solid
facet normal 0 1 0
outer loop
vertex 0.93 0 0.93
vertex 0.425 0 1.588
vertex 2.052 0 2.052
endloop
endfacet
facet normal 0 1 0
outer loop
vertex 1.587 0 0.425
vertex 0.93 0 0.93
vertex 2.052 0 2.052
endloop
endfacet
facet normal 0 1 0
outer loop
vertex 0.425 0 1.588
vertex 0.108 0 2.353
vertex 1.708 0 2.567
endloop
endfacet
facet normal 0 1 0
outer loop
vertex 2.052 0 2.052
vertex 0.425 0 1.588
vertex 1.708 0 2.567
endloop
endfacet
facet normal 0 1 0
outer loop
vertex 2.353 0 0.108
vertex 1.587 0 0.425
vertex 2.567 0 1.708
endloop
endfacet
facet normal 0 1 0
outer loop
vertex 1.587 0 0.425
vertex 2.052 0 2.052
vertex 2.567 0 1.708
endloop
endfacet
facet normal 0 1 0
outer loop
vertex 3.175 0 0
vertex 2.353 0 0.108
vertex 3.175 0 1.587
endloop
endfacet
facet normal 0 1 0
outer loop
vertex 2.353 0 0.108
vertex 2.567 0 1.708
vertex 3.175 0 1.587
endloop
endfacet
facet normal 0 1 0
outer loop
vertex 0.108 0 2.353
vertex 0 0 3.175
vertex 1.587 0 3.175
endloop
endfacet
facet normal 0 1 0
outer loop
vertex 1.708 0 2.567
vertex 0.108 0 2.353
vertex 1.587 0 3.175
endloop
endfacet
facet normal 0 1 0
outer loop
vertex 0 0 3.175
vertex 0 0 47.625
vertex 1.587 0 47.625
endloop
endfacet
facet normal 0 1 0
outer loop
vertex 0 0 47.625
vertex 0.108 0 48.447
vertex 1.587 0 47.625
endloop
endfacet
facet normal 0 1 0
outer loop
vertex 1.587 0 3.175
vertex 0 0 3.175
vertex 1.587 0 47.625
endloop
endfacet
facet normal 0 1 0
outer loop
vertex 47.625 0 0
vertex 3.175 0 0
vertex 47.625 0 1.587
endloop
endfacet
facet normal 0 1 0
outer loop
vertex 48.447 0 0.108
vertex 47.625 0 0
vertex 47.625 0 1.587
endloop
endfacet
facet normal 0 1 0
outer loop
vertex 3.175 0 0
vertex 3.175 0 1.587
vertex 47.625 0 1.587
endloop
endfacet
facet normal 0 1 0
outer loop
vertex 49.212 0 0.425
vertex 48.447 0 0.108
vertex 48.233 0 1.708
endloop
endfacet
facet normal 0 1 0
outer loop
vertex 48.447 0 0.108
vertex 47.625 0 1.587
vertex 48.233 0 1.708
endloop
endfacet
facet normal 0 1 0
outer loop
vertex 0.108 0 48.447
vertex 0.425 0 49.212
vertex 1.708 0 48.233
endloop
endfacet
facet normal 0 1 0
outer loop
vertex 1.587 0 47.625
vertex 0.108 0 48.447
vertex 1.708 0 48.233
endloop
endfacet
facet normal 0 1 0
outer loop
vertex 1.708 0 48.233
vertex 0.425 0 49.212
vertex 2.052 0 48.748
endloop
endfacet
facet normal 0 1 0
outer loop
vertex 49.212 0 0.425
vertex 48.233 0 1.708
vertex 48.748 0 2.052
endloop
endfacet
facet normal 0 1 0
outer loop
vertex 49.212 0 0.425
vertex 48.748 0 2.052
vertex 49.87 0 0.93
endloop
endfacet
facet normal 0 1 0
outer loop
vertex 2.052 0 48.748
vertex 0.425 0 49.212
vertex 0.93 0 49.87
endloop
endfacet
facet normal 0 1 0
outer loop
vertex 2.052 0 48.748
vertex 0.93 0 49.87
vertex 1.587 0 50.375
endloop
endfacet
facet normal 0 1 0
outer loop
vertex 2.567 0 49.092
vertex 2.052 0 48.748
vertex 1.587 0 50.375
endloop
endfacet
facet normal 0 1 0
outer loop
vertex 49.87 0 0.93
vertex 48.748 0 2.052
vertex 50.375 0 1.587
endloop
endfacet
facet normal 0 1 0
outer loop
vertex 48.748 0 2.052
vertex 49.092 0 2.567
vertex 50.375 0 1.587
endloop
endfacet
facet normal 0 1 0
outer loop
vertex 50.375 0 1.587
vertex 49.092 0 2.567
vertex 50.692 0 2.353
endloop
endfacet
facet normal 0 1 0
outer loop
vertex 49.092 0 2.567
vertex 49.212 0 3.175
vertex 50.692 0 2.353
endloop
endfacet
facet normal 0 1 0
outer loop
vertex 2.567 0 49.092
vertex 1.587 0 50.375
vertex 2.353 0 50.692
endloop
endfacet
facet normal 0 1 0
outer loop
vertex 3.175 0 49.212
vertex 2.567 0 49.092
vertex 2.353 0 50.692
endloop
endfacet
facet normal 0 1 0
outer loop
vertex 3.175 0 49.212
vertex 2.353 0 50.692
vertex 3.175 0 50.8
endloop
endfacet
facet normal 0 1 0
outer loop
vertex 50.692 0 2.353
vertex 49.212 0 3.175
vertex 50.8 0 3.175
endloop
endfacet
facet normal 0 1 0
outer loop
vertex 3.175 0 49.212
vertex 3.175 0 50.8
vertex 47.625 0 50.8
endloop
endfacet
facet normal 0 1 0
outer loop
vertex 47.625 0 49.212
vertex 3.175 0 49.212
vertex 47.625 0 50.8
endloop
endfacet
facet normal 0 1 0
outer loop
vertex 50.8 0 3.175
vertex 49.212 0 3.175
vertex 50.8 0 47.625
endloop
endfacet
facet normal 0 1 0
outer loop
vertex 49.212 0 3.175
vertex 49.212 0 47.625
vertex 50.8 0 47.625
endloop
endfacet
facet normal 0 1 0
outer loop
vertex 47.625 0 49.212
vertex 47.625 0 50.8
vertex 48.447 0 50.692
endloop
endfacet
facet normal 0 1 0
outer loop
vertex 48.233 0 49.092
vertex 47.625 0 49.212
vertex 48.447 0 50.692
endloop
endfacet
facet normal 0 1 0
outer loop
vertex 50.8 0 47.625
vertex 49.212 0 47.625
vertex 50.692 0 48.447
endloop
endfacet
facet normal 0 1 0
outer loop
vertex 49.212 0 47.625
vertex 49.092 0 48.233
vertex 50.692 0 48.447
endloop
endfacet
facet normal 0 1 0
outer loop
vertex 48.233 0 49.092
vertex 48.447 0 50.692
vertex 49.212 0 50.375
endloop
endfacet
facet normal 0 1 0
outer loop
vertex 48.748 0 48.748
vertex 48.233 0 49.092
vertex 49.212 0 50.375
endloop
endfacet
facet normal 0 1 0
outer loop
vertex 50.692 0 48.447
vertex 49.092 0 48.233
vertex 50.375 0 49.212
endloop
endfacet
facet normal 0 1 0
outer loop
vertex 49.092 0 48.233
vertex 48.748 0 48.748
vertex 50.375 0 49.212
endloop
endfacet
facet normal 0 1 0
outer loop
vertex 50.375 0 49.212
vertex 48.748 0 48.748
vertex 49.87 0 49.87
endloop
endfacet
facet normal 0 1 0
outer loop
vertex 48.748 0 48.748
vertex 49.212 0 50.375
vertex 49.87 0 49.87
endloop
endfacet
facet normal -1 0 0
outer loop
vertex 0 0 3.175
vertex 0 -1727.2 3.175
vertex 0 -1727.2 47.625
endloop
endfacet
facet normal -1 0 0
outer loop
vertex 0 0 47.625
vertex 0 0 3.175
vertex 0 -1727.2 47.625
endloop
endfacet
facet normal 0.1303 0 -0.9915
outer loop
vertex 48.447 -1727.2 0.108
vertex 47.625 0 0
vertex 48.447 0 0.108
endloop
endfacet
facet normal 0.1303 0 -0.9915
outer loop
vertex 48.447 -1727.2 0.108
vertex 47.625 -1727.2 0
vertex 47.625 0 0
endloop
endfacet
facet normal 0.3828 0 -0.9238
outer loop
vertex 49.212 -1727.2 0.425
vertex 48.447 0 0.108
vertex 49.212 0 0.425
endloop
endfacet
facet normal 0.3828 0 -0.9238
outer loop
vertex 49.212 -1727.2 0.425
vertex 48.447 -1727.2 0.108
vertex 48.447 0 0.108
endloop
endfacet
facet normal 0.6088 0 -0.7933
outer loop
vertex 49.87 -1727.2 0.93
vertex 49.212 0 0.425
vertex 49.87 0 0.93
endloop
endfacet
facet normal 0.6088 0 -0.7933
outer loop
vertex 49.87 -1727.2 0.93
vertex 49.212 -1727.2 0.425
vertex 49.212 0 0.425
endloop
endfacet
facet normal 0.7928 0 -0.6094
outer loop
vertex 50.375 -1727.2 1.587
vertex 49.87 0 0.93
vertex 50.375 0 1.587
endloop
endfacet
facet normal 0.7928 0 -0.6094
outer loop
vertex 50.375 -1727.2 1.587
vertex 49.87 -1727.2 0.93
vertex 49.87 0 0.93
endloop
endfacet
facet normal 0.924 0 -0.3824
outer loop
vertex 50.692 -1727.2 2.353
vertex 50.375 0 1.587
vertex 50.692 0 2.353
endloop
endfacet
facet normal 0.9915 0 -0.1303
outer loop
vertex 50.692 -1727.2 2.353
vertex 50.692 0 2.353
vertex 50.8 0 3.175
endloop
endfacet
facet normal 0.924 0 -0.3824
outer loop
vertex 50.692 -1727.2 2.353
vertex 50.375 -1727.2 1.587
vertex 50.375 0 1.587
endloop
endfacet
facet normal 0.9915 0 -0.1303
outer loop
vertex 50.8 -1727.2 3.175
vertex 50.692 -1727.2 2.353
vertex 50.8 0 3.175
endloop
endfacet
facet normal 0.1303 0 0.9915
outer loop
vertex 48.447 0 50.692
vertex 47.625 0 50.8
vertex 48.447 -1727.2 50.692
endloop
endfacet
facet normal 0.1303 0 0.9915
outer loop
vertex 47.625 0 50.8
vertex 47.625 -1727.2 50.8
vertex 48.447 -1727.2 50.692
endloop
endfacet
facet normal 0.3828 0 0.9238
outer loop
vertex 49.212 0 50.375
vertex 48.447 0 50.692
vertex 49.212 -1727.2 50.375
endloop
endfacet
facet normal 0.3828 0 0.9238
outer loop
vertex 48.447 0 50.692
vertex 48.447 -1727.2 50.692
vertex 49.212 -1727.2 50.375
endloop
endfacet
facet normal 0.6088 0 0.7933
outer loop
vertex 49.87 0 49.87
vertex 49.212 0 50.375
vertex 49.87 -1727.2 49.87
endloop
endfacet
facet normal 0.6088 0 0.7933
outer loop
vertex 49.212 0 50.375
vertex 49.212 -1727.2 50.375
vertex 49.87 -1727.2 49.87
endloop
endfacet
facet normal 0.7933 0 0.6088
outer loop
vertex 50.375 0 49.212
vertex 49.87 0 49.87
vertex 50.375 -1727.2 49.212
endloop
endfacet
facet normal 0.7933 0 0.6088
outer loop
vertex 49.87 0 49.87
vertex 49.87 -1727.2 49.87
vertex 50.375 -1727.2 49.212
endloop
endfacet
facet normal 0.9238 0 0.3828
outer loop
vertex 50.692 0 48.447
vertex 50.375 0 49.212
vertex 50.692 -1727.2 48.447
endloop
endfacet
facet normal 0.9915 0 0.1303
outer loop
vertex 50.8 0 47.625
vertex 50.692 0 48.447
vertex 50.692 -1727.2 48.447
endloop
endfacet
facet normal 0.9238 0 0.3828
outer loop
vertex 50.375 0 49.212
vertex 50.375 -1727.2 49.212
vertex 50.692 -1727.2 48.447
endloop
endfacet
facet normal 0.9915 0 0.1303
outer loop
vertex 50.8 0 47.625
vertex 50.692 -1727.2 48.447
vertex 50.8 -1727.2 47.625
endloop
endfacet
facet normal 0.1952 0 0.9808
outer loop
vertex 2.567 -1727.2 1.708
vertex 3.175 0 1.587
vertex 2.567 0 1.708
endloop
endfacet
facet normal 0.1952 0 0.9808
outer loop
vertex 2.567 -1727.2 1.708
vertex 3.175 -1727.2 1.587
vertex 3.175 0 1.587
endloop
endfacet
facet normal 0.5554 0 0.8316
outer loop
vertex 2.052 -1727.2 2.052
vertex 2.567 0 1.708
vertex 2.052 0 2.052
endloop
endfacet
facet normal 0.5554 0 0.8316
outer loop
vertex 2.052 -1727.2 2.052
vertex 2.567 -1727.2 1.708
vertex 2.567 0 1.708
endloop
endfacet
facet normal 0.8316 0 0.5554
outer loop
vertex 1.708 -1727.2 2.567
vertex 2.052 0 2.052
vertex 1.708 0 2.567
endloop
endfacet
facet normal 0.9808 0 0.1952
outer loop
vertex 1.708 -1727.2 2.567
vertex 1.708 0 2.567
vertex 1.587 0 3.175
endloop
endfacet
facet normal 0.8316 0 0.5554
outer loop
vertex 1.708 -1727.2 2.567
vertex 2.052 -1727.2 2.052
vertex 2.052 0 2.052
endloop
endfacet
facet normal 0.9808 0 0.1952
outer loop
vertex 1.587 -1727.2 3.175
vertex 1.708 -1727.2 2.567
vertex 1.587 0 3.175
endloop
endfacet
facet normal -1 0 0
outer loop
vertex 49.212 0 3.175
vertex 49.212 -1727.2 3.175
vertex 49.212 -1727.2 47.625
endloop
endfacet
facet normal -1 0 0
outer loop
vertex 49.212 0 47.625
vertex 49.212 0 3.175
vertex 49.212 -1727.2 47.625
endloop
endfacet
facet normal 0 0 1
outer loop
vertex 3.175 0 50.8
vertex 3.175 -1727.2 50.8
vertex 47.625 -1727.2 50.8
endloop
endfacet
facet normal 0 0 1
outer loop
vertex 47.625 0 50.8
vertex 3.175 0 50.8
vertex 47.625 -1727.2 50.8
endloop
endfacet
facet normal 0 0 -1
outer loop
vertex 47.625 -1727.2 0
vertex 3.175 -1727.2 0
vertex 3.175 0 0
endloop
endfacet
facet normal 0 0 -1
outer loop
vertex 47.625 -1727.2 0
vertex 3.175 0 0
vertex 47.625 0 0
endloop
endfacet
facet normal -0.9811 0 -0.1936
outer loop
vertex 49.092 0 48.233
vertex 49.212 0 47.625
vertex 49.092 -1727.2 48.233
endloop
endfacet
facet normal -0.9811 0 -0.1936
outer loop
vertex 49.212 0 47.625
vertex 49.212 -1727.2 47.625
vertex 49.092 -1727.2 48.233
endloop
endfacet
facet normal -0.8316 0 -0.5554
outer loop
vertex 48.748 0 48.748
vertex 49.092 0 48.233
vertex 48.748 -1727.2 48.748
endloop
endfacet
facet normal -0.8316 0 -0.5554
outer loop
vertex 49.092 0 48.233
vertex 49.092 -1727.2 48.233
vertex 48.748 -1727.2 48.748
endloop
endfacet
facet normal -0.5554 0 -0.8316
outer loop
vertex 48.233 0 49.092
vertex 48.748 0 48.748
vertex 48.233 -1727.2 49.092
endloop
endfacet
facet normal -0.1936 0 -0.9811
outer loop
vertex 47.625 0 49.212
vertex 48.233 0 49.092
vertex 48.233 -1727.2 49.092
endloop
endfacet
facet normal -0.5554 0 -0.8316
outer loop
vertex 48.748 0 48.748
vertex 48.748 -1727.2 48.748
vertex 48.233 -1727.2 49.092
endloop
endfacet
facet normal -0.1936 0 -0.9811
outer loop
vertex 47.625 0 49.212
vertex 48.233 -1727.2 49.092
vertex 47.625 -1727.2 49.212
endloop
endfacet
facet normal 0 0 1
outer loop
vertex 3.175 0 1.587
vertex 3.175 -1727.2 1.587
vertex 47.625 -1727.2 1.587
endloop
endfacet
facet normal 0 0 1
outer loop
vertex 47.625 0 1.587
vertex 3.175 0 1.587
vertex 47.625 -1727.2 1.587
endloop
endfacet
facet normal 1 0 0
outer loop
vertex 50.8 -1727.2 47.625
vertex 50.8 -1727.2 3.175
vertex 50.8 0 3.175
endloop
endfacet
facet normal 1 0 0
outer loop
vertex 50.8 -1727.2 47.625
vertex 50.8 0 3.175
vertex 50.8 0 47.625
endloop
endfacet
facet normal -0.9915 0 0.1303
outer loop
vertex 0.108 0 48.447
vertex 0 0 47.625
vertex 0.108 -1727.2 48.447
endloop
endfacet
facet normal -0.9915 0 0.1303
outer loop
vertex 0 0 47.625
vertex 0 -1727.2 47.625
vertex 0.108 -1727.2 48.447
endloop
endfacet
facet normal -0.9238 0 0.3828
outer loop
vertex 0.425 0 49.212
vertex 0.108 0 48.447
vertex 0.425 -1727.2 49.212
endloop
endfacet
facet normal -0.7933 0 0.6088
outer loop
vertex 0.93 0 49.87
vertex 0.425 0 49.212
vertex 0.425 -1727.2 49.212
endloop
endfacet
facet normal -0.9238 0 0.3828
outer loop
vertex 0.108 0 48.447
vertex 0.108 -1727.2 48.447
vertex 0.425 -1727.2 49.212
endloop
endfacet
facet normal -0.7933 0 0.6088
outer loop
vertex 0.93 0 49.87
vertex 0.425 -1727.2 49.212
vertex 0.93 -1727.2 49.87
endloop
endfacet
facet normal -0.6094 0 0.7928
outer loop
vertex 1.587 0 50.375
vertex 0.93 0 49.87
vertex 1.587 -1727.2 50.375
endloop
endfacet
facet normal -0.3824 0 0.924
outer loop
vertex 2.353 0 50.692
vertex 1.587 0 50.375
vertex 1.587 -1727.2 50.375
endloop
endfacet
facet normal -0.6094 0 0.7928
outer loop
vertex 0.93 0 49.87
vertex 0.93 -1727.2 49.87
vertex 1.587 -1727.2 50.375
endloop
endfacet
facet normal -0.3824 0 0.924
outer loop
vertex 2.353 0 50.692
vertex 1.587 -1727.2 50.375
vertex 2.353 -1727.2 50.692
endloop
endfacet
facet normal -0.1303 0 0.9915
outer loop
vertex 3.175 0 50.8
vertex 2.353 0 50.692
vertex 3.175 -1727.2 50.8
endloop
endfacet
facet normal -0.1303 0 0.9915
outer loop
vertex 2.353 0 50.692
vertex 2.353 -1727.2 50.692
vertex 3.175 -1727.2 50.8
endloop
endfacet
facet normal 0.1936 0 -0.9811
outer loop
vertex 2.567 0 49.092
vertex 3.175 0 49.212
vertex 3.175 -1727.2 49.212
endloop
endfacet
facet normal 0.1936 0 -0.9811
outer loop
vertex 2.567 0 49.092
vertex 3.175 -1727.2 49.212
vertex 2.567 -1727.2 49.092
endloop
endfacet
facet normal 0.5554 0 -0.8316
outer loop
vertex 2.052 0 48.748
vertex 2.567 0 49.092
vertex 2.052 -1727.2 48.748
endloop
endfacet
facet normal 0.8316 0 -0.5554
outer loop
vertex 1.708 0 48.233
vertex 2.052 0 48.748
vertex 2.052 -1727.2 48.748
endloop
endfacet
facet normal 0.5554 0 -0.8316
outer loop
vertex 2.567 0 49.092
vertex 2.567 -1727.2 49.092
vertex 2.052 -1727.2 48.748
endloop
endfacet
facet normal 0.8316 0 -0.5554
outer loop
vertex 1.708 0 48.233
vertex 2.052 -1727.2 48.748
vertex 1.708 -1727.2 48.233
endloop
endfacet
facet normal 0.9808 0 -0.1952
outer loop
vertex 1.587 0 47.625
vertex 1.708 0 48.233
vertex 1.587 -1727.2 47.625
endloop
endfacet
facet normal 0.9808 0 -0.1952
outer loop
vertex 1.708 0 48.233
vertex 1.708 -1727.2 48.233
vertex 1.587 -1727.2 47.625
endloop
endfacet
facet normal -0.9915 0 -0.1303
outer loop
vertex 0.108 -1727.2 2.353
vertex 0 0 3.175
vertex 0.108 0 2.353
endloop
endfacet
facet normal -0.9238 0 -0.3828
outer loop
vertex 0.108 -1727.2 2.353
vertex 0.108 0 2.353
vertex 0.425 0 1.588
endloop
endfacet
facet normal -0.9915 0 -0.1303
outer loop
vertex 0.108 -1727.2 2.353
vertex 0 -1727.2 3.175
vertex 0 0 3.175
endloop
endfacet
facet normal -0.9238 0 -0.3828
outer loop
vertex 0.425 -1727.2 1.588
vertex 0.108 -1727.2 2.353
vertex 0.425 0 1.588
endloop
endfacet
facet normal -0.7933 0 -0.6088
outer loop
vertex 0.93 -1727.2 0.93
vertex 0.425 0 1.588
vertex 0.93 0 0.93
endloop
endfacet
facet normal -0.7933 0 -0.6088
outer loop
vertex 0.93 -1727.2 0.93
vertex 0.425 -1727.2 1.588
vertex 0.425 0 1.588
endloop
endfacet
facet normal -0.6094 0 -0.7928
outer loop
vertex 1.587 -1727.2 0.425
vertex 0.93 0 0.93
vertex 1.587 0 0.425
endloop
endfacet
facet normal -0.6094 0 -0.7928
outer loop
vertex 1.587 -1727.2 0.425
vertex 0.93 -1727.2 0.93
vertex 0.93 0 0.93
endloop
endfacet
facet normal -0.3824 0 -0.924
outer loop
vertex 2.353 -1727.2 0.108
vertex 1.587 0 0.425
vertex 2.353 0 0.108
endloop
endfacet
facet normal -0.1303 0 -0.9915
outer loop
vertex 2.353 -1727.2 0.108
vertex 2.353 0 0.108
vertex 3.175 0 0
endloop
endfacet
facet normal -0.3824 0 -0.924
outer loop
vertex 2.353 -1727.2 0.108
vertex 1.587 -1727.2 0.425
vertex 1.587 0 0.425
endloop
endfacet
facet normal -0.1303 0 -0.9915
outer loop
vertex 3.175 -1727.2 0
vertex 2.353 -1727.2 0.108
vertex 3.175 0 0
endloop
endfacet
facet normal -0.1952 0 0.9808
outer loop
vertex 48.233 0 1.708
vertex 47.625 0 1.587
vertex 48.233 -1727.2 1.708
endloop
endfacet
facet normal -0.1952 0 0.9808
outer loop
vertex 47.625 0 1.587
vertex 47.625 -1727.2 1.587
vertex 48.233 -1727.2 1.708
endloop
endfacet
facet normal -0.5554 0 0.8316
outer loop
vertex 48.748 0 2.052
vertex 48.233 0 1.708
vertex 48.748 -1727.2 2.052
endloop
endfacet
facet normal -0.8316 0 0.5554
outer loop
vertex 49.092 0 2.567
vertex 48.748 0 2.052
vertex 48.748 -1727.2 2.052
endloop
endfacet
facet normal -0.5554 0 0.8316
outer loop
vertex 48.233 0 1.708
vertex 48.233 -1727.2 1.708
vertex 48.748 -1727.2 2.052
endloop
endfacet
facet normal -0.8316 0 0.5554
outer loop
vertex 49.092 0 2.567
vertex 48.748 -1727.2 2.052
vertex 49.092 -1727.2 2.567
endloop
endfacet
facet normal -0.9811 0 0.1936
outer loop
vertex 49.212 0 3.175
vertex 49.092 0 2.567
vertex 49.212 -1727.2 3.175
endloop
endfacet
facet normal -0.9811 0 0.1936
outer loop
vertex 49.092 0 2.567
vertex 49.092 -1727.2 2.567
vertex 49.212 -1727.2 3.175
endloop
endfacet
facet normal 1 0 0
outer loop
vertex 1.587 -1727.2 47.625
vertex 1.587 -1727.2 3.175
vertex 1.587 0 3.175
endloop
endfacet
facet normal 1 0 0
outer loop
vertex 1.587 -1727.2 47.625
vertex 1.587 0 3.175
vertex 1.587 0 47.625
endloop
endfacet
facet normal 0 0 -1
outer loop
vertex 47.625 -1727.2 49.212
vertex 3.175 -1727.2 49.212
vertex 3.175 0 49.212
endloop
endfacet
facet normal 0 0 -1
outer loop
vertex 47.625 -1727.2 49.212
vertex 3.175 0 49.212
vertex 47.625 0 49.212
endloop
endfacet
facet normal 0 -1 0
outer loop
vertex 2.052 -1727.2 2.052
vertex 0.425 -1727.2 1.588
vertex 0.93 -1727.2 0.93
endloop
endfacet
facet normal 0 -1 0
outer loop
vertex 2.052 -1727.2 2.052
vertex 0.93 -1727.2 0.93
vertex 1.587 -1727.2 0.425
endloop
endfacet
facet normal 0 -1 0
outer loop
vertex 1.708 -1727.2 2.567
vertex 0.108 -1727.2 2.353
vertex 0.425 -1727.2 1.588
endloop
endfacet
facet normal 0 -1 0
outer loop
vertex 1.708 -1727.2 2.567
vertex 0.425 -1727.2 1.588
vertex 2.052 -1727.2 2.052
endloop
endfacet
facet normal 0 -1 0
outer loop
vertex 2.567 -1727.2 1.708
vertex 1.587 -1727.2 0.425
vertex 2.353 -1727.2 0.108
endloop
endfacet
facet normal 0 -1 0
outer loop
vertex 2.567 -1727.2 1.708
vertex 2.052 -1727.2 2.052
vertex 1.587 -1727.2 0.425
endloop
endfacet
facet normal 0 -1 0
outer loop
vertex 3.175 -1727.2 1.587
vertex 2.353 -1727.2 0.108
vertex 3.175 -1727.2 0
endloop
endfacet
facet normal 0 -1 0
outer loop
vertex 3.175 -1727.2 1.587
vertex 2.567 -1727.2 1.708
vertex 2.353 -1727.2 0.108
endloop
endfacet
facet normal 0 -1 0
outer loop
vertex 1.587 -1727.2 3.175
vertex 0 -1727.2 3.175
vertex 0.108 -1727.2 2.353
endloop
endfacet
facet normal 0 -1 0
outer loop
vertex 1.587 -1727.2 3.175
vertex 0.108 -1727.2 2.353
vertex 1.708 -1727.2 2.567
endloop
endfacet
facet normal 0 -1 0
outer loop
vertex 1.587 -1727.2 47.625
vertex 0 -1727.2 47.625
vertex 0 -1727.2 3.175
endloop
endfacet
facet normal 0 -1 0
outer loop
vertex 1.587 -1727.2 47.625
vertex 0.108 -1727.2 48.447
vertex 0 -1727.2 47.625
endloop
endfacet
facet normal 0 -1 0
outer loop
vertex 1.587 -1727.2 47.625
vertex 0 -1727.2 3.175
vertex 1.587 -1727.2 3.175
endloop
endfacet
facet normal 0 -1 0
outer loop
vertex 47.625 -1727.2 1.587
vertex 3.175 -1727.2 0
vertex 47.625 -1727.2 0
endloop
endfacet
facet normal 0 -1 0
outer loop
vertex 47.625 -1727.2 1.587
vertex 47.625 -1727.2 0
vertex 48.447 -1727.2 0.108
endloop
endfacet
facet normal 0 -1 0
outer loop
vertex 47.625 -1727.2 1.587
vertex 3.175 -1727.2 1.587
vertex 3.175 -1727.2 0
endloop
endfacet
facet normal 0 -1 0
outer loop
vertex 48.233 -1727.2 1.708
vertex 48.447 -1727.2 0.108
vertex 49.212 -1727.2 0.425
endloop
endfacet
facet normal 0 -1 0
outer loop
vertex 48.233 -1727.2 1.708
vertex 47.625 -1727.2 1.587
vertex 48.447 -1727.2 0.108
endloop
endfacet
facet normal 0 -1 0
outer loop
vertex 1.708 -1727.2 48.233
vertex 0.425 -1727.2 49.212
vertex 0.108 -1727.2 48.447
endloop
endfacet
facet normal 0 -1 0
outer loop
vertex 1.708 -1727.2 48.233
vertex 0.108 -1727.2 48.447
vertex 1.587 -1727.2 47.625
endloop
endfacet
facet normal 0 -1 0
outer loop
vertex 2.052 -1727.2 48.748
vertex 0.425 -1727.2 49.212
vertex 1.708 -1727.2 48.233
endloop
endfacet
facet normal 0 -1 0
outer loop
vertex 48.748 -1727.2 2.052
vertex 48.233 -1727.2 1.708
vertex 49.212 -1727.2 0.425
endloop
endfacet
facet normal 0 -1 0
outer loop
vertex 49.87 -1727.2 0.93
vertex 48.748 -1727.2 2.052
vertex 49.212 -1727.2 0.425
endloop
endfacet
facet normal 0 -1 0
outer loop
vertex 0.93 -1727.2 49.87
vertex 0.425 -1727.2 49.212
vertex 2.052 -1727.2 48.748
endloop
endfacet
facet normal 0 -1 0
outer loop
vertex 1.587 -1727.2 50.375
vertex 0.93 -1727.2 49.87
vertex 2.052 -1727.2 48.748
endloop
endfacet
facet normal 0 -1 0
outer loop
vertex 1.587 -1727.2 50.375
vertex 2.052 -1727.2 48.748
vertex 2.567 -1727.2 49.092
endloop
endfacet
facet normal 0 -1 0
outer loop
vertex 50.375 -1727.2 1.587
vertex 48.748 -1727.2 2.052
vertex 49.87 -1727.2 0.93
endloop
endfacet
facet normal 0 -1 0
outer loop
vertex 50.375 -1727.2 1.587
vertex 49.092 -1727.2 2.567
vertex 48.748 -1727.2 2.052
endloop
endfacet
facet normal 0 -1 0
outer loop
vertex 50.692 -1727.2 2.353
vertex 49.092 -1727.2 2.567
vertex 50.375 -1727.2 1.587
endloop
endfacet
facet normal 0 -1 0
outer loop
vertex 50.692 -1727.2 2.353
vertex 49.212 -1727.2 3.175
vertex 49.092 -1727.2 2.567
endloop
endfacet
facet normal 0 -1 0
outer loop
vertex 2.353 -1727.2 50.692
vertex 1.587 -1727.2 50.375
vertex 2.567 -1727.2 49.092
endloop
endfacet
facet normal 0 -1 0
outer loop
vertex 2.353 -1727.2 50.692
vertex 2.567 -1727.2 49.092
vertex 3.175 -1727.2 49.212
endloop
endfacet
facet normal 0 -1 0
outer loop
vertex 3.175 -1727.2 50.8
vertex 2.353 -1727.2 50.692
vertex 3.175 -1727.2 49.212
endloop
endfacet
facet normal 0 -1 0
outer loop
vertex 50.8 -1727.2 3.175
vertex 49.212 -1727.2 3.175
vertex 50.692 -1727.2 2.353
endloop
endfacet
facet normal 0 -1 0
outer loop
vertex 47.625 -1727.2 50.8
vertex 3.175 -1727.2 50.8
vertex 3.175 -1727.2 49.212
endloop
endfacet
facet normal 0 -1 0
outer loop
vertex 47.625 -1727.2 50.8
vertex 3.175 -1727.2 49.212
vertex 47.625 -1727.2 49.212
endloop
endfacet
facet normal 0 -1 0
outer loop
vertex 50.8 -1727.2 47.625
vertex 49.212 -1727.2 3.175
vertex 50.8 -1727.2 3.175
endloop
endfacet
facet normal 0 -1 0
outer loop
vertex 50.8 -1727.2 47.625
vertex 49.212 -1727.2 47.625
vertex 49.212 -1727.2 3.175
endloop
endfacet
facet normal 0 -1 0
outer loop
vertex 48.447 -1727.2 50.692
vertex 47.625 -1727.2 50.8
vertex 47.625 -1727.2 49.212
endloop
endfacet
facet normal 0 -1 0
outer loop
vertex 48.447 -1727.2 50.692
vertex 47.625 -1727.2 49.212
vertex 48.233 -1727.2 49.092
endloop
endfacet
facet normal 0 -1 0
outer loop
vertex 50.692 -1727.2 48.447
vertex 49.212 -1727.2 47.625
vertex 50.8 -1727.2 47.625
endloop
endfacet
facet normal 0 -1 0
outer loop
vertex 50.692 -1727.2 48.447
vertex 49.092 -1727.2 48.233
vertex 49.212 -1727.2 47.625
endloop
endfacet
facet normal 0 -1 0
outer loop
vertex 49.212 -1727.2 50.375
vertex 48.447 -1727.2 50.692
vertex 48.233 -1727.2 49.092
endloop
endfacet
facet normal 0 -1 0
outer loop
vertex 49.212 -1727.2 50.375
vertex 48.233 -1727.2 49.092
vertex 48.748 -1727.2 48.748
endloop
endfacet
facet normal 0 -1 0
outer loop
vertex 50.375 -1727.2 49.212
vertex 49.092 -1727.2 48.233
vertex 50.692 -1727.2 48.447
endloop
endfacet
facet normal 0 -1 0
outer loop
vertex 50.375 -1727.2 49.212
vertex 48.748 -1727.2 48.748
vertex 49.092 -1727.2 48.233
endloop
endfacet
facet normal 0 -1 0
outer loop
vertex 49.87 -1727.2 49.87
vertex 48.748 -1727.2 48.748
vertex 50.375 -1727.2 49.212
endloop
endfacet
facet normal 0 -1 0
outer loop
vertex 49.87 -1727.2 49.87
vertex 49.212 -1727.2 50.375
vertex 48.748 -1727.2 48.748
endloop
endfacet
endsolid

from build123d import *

# Parameters (mm, degrees)
F0_W     = 50.8
F0_H     = 50.8
F0_W_2   = 47.625
F0_H_2   = 47.625
F1_DEPTH = 1727.2
F2_R     = 3.175
F3_R     = 1.5875


with BuildPart() as f1:
    # F0 (on Front) → F1 (new body)
    with BuildSketch(Plane.XZ):
        with Locations((25.4, 25.4)):
            Rectangle(F0_W, F0_H)
        with Locations((25.4, 25.4)):
            Rectangle(F0_W_2, F0_H_2, mode=Mode.SUBTRACT)
    extrude(amount=F1_DEPTH)

    # F2
    f2_edges = [f1.edges().sort_by_distance(p)[0] for p in [
        (0, -863.6, 50.8),
        (50.8, -863.6, 50.8),
        (50.8, -863.6, 0),
        (0, -863.6, 0),
    ]]
    fillet(f2_edges, radius=F2_R)

    # F3
    f3_edges = [f1.edges().sort_by_distance(p)[0] for p in [
        (1.5875, -863.6, 49.2125),
        (49.2125, -863.6, 49.2125),
        (1.5875, -863.6, 1.5875),
        (49.2125, -863.6, 1.5875),
    ]]
    fillet(f3_edges, radius=F3_R)


solid = f1.part
